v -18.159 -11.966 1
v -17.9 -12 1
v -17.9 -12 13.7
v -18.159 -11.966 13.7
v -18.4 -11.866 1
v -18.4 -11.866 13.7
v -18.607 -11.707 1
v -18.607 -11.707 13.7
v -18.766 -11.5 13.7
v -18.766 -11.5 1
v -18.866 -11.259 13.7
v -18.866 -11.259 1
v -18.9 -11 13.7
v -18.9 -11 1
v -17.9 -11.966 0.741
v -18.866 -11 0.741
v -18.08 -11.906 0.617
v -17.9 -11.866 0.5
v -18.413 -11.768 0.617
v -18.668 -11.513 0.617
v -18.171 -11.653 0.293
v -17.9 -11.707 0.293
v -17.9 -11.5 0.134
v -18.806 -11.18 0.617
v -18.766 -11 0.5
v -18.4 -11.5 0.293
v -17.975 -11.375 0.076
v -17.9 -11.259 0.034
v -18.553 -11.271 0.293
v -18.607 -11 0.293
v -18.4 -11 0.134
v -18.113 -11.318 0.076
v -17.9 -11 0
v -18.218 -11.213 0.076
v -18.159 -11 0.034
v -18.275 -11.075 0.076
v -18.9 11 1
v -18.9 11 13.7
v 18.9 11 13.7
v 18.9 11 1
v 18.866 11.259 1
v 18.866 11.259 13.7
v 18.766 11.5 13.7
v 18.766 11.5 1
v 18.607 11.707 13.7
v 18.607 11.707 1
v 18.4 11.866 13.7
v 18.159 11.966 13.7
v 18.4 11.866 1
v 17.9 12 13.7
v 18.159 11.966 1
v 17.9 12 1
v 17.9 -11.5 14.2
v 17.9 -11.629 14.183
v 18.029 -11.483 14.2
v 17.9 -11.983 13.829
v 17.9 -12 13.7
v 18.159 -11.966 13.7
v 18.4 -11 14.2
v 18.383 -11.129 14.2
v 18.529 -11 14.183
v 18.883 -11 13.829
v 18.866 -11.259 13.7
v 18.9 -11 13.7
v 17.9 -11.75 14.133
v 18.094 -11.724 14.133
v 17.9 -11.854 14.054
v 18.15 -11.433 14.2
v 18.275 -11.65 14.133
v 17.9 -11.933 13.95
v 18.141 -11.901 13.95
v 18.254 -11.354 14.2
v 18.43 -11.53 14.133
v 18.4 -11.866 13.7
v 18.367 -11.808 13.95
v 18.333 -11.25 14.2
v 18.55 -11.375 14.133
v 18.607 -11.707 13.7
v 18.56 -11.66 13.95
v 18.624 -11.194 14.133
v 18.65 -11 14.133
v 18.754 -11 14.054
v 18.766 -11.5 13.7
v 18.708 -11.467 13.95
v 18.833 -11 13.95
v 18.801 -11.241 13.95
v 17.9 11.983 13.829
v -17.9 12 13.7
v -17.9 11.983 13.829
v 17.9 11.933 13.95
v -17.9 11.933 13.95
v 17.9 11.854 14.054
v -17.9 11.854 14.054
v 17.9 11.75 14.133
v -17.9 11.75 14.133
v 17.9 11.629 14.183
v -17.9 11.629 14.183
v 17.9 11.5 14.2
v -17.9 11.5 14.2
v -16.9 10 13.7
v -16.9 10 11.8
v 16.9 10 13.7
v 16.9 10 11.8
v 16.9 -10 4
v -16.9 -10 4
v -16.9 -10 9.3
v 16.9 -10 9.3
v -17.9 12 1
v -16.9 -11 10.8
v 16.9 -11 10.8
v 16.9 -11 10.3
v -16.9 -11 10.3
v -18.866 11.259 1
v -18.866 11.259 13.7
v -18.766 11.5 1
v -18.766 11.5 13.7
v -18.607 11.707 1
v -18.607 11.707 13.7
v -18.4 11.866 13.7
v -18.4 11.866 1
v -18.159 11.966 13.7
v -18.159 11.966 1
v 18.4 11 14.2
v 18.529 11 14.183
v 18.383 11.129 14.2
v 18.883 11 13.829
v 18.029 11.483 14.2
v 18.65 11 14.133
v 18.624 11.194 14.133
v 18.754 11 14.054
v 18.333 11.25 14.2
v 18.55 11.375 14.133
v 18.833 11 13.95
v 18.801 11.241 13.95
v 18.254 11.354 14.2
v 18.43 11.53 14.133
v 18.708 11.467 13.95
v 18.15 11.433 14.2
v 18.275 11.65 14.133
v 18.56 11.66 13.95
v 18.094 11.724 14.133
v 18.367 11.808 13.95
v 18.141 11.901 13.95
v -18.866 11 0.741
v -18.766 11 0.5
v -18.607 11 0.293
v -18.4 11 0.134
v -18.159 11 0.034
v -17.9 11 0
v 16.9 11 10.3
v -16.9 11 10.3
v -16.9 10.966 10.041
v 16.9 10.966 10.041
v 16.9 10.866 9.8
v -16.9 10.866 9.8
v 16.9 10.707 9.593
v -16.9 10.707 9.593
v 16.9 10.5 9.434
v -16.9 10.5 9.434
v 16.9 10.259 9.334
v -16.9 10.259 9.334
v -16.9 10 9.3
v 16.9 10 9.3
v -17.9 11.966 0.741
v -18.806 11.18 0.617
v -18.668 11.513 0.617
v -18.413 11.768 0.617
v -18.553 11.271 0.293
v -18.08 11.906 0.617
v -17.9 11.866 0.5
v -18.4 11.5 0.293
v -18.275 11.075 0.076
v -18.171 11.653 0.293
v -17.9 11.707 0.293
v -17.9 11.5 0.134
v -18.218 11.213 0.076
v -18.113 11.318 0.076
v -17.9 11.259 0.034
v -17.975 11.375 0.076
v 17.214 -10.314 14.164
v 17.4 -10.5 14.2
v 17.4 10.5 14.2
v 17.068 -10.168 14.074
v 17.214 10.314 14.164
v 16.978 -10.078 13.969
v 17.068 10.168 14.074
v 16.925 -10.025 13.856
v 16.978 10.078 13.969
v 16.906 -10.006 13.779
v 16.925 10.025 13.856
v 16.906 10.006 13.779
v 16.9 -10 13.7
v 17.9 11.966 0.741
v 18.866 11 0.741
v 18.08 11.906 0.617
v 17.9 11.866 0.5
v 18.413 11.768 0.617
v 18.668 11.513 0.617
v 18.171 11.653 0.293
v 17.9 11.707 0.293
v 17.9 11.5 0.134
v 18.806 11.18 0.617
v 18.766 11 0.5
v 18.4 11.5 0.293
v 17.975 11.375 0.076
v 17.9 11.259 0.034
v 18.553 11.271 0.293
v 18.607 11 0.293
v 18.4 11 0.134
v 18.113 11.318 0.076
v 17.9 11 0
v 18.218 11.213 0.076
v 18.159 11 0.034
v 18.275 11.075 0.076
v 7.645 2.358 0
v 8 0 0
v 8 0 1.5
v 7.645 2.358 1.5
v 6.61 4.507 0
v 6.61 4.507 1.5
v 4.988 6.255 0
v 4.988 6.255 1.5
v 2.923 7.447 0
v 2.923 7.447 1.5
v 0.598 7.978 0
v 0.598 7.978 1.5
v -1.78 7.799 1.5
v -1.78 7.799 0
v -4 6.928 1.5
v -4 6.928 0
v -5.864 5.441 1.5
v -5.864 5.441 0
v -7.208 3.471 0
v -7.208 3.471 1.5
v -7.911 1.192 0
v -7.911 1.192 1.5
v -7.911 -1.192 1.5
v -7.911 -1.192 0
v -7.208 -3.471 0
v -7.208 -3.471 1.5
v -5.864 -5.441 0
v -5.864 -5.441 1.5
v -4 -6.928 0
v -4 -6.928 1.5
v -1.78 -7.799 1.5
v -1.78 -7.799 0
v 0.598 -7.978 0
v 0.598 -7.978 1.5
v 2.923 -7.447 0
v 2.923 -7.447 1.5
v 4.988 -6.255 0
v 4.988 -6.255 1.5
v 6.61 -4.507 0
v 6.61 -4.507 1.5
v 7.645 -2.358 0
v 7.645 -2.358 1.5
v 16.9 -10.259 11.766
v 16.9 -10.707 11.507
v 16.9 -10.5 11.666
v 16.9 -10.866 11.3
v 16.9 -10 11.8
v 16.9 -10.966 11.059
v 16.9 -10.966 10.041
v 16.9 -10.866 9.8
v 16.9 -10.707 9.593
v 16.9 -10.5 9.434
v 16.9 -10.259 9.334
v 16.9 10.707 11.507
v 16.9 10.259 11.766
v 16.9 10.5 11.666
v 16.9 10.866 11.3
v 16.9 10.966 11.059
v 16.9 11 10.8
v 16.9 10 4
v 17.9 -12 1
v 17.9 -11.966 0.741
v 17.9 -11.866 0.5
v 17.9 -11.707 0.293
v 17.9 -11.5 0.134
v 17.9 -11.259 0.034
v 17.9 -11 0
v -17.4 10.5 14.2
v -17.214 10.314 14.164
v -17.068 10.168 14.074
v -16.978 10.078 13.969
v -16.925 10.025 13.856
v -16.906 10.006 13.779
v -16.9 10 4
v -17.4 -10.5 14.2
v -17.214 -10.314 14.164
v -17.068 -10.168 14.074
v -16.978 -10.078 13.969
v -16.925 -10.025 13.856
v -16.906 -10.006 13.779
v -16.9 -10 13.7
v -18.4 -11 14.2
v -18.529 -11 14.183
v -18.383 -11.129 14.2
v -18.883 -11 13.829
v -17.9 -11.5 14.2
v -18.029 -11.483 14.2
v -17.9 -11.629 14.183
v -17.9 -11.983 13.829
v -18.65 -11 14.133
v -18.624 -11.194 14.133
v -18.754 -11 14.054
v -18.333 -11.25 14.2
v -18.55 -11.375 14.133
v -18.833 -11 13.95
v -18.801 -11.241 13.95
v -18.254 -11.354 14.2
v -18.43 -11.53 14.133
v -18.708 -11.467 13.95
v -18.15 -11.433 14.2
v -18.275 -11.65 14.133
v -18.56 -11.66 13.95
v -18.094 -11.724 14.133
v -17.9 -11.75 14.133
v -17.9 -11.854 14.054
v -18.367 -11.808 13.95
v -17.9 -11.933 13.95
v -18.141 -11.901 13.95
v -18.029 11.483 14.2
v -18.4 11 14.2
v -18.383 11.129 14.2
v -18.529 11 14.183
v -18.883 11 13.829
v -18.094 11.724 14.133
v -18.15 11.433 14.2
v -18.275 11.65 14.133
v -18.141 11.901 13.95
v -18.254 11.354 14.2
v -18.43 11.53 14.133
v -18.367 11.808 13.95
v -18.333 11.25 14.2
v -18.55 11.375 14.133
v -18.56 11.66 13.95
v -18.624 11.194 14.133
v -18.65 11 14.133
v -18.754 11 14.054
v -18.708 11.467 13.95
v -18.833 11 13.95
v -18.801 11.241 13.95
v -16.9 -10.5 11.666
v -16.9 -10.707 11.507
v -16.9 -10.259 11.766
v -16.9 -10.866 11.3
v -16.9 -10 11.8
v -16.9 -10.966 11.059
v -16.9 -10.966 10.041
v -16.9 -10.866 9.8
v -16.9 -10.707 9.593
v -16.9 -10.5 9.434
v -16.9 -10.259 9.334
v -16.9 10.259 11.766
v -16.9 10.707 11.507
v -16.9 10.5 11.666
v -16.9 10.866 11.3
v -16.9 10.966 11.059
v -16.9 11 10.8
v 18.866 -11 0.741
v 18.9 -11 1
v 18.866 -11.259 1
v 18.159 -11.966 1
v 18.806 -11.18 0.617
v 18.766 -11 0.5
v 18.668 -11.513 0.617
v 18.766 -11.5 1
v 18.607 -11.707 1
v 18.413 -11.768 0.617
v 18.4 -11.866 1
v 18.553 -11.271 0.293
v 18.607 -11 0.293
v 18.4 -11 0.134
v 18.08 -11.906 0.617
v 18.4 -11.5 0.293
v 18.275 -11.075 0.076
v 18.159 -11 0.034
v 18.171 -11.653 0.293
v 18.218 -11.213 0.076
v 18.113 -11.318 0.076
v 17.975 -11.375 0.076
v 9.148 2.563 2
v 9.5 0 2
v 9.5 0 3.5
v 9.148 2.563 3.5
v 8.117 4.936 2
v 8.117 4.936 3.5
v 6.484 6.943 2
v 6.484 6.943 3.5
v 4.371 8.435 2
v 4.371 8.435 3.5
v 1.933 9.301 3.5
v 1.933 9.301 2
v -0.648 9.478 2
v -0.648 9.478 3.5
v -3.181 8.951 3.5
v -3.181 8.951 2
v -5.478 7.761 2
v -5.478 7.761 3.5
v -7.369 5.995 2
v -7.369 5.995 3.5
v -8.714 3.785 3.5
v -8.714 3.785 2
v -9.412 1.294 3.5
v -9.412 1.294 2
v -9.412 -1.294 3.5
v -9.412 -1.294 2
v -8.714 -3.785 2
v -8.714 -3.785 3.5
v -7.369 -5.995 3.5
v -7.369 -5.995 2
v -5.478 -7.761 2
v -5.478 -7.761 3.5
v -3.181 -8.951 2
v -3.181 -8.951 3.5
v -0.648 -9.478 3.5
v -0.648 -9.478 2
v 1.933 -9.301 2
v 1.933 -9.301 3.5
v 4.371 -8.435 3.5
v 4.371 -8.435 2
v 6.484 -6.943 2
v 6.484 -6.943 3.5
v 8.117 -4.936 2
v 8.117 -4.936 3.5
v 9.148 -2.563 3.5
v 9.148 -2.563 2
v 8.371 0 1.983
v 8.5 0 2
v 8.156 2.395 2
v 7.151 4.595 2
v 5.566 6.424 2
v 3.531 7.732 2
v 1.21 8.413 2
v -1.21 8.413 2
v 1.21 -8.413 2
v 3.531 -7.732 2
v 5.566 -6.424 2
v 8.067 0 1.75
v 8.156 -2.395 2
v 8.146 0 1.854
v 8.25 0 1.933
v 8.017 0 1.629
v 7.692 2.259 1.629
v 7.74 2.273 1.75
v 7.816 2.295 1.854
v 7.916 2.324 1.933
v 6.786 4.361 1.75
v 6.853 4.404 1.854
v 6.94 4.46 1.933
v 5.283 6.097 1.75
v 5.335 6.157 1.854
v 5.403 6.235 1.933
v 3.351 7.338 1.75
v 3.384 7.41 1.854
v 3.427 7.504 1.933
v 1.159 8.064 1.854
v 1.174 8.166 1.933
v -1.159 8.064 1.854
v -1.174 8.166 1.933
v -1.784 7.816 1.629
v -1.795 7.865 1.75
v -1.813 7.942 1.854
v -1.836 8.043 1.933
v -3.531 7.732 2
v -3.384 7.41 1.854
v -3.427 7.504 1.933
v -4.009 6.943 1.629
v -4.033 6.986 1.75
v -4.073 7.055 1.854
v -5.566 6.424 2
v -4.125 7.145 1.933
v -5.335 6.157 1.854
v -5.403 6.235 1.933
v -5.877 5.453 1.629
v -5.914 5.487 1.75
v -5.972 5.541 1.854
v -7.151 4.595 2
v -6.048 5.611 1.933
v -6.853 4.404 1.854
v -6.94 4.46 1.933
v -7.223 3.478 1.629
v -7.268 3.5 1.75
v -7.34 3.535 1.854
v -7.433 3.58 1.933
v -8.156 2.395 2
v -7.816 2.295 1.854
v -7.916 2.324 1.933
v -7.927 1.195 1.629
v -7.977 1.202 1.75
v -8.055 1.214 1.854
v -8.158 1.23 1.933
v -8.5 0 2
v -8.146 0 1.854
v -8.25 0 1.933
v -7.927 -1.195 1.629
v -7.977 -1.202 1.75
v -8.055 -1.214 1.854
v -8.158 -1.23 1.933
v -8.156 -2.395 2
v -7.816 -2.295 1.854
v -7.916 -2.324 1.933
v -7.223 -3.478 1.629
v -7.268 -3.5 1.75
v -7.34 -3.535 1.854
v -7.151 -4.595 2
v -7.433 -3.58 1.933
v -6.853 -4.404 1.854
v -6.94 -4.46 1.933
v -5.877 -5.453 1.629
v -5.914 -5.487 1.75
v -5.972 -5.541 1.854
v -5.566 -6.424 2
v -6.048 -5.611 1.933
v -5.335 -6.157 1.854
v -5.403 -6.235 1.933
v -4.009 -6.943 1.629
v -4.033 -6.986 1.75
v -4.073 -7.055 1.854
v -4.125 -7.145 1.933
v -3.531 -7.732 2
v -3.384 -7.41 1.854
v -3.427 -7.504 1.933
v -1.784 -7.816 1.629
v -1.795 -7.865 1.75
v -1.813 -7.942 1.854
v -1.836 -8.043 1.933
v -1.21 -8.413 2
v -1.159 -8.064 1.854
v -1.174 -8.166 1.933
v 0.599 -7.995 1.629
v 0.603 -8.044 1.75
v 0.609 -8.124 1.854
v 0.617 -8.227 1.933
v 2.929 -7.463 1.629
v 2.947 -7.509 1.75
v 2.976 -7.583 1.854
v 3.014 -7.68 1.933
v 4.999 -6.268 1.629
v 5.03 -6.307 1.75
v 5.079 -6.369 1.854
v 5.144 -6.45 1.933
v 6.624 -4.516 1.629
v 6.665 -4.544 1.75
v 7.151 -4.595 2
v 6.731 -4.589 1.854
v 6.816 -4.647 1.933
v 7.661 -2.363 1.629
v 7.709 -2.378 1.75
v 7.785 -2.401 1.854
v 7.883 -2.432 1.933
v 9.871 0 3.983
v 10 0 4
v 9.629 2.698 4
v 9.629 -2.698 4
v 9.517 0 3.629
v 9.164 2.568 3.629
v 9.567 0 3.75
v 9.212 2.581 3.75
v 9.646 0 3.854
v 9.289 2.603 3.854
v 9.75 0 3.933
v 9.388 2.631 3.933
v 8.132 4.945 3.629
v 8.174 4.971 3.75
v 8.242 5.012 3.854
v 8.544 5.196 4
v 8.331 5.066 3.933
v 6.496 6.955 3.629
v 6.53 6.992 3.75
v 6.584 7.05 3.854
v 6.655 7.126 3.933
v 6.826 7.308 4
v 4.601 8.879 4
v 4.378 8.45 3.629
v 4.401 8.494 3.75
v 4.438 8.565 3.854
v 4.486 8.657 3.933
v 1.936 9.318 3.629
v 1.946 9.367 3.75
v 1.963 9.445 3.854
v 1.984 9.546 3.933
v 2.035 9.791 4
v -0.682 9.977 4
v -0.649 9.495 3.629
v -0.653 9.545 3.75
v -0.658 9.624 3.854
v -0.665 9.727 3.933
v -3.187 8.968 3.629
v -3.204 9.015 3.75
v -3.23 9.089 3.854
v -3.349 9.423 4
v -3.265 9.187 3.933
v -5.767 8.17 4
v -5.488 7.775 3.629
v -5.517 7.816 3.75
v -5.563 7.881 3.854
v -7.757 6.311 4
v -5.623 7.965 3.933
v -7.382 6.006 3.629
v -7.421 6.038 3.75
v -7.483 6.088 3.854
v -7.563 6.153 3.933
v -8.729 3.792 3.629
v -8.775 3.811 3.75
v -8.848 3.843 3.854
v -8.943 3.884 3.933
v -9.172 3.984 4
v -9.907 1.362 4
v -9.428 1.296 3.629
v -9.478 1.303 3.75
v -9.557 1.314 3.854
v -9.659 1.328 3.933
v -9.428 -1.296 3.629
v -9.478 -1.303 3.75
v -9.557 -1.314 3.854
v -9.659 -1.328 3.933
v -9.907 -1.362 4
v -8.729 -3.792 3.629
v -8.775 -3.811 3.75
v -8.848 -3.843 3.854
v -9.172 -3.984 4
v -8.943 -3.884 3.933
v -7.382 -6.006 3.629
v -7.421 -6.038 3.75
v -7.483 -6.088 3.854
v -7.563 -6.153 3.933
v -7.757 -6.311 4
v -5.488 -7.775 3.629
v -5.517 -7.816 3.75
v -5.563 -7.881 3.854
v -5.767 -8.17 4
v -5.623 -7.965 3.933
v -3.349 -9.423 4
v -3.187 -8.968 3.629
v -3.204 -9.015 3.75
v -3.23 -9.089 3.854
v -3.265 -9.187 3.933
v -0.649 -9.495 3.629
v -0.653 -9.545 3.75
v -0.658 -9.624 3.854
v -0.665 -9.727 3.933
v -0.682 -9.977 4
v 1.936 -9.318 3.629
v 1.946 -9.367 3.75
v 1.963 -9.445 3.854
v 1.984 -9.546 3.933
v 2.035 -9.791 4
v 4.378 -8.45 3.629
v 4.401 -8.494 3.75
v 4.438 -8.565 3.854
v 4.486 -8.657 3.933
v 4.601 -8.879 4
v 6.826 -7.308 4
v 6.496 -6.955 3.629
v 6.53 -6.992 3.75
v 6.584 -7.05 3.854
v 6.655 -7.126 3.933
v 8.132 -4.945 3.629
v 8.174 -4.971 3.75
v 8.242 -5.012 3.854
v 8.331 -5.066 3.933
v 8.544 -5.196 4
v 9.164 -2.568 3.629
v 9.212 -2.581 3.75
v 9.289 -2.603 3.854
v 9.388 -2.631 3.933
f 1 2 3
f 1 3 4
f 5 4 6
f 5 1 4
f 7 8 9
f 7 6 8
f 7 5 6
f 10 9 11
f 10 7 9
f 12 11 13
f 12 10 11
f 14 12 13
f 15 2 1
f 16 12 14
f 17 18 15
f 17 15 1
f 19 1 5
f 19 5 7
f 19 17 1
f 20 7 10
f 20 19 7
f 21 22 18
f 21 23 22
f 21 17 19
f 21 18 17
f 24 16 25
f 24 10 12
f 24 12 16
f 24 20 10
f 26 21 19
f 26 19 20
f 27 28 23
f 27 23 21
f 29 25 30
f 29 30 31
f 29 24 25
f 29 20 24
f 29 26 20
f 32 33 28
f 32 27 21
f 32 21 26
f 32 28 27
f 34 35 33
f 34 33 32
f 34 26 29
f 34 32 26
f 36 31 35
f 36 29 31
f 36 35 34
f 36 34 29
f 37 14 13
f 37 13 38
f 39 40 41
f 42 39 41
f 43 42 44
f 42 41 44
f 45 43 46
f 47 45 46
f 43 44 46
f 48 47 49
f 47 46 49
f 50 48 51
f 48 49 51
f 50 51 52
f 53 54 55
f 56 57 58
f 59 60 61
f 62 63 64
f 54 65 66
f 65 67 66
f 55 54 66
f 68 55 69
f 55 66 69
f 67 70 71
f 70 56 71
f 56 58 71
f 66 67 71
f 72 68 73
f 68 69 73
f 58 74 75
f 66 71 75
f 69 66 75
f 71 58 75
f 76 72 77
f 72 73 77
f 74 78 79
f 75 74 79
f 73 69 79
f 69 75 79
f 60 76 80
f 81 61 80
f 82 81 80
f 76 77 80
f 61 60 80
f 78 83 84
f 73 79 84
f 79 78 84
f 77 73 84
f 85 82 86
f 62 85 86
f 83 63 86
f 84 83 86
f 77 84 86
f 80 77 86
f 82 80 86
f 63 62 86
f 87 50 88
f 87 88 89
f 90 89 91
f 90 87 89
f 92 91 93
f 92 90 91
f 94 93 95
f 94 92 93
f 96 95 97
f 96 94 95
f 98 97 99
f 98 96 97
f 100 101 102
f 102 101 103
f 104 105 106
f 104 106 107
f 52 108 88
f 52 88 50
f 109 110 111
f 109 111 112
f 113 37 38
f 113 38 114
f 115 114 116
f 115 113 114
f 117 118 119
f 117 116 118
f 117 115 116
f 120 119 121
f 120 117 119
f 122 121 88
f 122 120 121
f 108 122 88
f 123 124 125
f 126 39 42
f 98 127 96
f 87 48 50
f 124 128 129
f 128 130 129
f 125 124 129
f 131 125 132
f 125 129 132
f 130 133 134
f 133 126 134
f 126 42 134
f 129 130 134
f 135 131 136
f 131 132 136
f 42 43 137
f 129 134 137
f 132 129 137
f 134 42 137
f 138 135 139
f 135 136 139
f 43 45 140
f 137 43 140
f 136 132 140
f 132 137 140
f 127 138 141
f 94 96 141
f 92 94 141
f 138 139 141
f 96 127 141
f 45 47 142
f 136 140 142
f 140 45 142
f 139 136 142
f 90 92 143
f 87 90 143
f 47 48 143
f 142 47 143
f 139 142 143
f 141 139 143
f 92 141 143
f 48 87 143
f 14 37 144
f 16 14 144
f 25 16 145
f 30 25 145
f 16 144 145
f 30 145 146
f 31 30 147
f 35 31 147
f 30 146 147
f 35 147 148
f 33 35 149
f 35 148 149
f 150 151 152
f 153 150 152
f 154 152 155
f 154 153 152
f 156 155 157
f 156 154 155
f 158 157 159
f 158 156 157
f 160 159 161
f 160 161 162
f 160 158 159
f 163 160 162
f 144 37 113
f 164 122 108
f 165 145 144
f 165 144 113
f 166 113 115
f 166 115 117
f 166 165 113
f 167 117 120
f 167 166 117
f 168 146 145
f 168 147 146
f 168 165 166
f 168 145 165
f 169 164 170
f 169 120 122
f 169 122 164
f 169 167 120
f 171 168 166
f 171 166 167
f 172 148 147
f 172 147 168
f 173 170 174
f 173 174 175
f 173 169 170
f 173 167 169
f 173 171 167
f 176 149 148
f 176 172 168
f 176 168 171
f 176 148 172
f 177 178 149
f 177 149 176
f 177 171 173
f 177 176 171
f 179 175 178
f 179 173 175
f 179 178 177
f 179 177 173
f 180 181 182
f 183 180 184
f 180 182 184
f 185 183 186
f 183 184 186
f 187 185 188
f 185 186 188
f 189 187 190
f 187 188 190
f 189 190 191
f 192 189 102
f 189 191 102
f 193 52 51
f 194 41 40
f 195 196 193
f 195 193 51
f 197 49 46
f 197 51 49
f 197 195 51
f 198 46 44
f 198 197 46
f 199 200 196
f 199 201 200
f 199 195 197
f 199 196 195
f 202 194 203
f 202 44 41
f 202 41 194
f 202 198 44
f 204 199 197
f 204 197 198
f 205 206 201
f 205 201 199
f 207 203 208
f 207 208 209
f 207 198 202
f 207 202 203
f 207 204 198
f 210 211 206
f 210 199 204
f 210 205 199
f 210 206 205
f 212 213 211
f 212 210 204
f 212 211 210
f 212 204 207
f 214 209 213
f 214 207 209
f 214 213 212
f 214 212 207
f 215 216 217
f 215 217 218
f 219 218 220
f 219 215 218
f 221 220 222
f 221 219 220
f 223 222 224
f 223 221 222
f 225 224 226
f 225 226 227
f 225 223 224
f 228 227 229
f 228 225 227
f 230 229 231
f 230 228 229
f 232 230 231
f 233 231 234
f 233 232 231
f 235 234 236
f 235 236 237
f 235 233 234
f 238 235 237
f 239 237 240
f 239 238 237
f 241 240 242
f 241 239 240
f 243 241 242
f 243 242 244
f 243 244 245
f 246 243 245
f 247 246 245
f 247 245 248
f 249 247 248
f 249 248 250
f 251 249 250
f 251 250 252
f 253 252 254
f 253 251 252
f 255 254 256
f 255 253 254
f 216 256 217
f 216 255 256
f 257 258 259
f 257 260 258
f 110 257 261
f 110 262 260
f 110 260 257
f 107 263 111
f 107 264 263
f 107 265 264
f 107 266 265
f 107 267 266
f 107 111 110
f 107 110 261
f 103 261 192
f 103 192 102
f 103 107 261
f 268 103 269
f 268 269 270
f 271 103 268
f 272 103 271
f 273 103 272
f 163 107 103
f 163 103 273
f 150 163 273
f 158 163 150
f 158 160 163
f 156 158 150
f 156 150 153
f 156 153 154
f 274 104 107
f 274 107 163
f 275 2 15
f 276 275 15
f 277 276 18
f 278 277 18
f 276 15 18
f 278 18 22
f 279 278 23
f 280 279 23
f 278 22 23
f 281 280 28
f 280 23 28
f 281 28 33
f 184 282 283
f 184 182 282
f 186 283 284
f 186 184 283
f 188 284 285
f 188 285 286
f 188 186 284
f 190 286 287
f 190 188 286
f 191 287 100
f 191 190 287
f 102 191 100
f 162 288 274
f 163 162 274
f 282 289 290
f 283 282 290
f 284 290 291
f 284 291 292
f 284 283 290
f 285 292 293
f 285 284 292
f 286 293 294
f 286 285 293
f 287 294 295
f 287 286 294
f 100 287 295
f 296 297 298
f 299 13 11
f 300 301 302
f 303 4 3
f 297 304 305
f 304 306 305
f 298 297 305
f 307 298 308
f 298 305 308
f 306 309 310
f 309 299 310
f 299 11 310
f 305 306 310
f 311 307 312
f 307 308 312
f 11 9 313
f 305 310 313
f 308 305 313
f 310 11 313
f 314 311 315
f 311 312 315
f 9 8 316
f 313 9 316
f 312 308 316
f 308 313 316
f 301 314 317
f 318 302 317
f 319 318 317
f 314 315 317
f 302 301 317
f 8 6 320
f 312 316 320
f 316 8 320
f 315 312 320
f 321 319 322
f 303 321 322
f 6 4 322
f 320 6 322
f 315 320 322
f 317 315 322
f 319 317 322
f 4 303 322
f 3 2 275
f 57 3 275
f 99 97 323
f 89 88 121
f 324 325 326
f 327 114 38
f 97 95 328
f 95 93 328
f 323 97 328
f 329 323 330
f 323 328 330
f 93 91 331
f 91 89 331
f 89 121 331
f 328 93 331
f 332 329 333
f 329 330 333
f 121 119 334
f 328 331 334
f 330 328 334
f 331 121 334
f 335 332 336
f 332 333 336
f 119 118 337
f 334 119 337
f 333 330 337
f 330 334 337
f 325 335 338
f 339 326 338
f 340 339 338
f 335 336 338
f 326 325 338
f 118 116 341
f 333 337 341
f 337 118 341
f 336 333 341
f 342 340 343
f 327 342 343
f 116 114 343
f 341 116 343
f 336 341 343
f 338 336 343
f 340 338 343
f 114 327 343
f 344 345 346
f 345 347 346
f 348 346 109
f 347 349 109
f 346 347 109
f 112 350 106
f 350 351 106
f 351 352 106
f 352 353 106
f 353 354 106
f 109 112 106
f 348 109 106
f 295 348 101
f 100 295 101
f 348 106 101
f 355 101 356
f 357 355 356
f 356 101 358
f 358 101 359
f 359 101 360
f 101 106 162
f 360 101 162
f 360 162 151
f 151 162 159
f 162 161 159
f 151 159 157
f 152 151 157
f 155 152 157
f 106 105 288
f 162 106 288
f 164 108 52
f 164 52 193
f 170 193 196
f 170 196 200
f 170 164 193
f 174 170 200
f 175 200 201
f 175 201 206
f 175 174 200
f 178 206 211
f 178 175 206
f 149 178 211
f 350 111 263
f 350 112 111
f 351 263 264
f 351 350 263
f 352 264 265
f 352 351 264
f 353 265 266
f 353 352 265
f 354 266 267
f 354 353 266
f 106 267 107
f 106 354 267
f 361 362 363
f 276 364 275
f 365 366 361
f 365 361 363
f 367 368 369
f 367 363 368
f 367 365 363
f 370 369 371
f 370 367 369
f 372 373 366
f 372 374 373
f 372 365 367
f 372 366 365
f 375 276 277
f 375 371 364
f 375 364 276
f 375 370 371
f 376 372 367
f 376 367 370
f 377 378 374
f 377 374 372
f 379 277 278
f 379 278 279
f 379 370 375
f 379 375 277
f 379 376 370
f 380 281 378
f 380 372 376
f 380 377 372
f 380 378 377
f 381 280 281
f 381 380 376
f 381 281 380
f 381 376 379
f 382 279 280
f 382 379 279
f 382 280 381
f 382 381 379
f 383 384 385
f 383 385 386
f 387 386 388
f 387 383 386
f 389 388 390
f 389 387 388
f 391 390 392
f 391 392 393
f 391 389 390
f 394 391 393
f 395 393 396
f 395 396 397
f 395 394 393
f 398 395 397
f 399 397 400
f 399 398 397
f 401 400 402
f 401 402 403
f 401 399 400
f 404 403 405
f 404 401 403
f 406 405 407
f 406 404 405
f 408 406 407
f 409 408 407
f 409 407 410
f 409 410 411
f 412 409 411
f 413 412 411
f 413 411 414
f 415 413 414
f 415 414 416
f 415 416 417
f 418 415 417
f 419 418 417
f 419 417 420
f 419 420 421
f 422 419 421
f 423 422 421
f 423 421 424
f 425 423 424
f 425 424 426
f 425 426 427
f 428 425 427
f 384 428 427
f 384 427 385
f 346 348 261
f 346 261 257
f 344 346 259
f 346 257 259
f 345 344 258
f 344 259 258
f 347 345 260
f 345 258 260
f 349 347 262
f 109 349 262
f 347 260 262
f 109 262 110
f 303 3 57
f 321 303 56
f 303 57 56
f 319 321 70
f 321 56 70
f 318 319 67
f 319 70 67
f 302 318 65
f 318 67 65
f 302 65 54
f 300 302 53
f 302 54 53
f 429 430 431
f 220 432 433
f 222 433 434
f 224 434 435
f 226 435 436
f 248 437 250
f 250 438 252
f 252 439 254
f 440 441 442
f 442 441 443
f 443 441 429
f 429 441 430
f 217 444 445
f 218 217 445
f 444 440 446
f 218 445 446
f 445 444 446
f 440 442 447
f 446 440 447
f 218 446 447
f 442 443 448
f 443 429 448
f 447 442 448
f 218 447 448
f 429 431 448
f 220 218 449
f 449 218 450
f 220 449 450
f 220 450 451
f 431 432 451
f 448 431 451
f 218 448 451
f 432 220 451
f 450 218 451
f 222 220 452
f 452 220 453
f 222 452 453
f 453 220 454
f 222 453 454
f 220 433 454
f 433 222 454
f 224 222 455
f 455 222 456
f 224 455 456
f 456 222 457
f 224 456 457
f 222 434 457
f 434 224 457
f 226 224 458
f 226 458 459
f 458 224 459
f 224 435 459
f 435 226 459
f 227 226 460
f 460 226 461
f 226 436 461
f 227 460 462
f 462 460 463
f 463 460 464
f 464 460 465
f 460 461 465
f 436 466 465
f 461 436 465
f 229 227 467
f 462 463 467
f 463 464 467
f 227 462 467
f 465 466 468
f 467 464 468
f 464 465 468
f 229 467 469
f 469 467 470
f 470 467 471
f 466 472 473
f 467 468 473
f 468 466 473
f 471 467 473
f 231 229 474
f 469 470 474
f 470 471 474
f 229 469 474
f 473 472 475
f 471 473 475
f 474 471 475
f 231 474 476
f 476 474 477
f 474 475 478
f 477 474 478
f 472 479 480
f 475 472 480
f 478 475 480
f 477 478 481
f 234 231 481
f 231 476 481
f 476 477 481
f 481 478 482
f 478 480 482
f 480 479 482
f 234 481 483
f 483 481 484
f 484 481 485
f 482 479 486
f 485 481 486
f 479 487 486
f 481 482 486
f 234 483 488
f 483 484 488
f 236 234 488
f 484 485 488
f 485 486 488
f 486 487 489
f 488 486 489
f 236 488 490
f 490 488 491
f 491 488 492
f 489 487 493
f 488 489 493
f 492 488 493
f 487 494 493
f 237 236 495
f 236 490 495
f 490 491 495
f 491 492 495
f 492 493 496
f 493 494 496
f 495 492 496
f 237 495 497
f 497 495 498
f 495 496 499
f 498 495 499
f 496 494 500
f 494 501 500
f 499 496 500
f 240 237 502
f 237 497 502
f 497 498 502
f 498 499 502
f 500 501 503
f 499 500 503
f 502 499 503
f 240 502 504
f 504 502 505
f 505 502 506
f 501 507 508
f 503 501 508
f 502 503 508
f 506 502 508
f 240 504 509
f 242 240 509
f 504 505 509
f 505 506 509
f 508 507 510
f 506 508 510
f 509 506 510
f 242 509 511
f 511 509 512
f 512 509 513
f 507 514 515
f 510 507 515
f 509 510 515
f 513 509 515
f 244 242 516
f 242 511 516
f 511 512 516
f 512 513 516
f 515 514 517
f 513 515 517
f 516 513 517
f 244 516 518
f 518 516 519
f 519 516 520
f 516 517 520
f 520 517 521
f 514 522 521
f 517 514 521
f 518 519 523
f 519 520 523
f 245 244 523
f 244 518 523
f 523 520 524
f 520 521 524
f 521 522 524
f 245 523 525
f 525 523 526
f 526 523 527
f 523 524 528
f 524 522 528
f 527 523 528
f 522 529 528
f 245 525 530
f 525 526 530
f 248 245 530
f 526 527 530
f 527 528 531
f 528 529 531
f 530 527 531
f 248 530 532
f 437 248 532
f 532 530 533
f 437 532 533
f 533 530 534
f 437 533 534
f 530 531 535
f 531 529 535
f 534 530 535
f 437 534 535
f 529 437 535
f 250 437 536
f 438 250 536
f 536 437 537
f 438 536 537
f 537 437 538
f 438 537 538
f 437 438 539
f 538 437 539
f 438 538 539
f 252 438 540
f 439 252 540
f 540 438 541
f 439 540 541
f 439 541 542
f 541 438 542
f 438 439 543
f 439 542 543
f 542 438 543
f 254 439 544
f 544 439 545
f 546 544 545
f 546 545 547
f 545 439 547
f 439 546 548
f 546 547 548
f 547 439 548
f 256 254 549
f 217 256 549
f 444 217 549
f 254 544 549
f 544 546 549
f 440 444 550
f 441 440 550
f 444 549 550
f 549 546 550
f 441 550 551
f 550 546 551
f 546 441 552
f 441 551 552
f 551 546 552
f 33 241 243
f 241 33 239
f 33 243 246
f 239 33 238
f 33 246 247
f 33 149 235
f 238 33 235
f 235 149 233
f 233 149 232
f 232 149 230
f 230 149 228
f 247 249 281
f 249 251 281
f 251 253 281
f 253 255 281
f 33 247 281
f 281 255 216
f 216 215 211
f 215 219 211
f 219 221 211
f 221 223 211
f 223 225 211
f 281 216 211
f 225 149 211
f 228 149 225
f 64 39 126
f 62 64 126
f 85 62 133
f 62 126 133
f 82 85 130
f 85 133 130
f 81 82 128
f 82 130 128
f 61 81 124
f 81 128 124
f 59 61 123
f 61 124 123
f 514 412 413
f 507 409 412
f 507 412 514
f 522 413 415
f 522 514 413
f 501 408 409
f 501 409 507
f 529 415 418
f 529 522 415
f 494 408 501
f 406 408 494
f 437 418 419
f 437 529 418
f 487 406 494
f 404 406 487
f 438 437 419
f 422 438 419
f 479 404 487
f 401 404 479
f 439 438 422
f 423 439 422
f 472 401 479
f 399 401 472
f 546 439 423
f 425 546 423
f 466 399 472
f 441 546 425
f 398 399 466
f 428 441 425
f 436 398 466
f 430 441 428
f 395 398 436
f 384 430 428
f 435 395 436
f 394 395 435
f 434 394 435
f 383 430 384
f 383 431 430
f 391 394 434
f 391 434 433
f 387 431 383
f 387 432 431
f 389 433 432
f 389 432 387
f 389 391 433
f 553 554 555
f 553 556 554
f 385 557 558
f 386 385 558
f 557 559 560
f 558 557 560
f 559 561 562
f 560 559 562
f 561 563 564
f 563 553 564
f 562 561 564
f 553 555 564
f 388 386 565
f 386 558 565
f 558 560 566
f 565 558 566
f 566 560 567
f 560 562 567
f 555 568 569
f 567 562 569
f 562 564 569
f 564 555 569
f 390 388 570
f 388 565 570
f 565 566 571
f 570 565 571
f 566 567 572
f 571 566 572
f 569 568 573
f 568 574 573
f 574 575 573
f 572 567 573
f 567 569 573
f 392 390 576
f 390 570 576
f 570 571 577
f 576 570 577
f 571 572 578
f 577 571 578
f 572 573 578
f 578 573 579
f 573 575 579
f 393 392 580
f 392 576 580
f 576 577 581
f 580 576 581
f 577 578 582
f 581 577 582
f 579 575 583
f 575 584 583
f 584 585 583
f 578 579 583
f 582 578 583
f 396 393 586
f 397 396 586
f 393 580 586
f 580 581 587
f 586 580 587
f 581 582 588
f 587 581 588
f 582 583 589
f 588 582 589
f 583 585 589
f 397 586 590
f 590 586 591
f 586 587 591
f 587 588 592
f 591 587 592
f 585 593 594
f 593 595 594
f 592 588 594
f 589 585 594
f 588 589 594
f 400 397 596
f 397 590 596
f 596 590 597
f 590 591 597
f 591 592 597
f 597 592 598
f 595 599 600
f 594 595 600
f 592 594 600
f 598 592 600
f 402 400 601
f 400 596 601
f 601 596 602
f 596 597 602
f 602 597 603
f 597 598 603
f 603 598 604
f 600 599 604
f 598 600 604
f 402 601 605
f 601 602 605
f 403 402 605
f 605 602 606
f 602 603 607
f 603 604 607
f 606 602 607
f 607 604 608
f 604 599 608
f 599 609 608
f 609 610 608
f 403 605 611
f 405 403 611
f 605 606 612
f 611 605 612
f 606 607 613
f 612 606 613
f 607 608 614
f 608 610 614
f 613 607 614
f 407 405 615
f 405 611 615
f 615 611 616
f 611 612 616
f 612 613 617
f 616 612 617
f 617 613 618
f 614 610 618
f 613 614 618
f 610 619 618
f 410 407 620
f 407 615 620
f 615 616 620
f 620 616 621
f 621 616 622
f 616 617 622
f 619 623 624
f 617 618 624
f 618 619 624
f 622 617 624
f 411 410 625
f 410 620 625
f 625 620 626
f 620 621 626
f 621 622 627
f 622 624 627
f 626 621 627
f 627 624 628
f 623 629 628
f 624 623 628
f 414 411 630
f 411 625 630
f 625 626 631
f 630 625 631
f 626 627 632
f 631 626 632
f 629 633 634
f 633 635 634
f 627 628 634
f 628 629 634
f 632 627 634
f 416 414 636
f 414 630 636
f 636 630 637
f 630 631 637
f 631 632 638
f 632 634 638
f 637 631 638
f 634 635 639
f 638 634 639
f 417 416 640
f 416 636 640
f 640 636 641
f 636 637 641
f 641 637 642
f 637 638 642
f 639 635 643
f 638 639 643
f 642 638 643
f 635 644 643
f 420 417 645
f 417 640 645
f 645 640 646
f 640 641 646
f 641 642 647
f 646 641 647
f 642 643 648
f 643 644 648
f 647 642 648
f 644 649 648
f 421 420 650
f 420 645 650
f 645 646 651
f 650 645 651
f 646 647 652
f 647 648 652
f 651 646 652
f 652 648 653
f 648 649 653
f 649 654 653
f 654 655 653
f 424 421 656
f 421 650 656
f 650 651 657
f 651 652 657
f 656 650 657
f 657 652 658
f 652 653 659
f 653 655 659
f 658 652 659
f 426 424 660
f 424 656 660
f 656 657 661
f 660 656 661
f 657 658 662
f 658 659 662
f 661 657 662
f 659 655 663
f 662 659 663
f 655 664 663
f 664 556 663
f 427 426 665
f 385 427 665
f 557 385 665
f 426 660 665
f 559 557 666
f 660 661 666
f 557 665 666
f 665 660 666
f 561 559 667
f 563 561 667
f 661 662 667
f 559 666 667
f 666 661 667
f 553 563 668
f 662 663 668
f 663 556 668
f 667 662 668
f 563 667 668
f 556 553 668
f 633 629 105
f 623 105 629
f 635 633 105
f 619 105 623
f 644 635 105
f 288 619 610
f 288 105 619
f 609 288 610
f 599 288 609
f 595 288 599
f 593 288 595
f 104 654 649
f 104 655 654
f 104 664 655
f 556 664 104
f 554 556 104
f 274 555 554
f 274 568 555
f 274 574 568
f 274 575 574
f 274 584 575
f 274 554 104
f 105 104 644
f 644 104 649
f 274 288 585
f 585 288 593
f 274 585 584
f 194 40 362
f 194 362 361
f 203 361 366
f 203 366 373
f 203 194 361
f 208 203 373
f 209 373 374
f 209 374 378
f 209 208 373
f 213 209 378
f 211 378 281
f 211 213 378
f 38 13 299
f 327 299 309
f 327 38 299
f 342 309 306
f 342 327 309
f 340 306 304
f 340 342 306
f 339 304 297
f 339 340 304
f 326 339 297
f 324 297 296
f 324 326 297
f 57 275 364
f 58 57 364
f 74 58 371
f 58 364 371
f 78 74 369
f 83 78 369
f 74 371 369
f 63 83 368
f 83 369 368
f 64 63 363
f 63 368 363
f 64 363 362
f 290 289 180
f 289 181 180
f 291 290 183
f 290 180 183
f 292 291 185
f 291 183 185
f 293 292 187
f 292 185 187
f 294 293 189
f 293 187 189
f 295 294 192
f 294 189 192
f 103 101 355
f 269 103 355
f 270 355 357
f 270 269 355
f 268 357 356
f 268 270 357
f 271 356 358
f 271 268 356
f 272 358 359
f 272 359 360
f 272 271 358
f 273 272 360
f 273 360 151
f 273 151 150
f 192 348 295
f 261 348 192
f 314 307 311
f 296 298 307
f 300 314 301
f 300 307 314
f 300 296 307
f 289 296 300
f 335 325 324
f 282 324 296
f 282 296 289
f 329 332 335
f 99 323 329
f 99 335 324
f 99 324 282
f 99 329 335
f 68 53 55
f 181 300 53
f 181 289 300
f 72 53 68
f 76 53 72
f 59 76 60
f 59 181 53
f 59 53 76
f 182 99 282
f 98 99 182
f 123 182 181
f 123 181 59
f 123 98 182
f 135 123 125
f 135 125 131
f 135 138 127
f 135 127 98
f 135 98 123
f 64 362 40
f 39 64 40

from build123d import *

# Parameters (mm, degrees)
F0_W          = 37.8
F0_H          = 24
F0_W_2        = 33.8
F0_H_2        = 20
F1_DEPTH      = 14.2
F0_R          = 9.5
F2_DEPTH      = 4
F0_R_2        = 8
F3_DEPTH      = 2
F4_W          = 33.8
F4_H          = 2.5
F5_DEPTH      = 1
F7_DEPTH      = 1
F8_R          = 0.49999
F9_R          = 0.99999
F10_T1_DEPTH  = 35.8
F10_T3_DEPTH  = 22
F10_T5_DEPTH  = 13.2
F10_T8_ANGLE  = 90
F10_T10_ANGLE = 90
F10_T12_ANGLE = 90
F10_T14_ANGLE = 90
F10_S17_W     = 1
F10_S17_H     = 1
F10_T18_DEPTH = 1
F10_S23_W     = 1
F10_S23_H     = 1
F10_T24_DEPTH = 1
F10_S29_W     = 1
F10_S29_H     = 1
F10_T30_DEPTH = 1
F10_S35_W     = 1
F10_S35_H     = 1
F10_T36_DEPTH = 1


# Not quite as in the source:
# - a fillet or chamfer that OpenCascade refuses, or shapes differently, is made with other operations: its cross-section is extruded or revolved along the edge and cut away or added
# - a fillet or chamfer is up to 0.001 mm smaller than in the source, because OpenCascade refuses the exact size


with BuildPart() as f1:
    # F0 (on Top) → F1 (new body)
    with BuildSketch(Plane.XY):
        Rectangle(F0_W, F0_H)
        Rectangle(F0_W_2, F0_H_2, mode=Mode.SUBTRACT)
    extrude(amount=F1_DEPTH)

    # F0 (on Top) → F2 (join)
    with BuildSketch(Plane.XY):
        Rectangle(F0_W_2, F0_H_2)
        Circle(F0_R, mode=Mode.SUBTRACT)
    extrude(amount=F2_DEPTH)

    # F0 (on Top) → F3 (join)
    with BuildSketch(Plane.XY):
        Circle(F0_R)
        Circle(F0_R_2, mode=Mode.SUBTRACT)
    extrude(amount=F3_DEPTH)

    # F4 (on face) → F5 (cut)
    with BuildSketch(Plane.XZ.offset(-10)):
        with Locations((0, 10.55)):
            Rectangle(F4_W, F4_H)
    extrude(amount=-F5_DEPTH, mode=Mode.SUBTRACT)

    # F6 (on face) → F7 (cut)
    with BuildSketch(Plane(origin=(0, -10, 0), x_dir=(-1, 0, 0), z_dir=(0, 1, 0))):
        Polygon((-16.9, 9.3), (1.5624057269, 9.3), (16.9, 9.3), (16.9, 11.8), (-16.9, 11.8), align=None)
    extrude(amount=-F7_DEPTH, mode=Mode.SUBTRACT)

    # F8 (radius 0.5 in the source; OpenCascade refuses exactly that, so slightly less here)
    f8_edges = [f1.edges().sort_by_distance(p)[0] for p in [
        (-9.5, 0, 4),
        (-8, 0, 2),
        (0, 10, 14.2),
        (16.9, 0, 14.2),
        (-16.9, 0, 14.2),
        (0, -10, 14.2),
        (0, -12, 14.2),
        (18.9, 0, 14.2),
        (0, 12, 14.2),
        (-18.9, 0, 14.2),
    ]]
    fillet(f8_edges, radius=F8_R)

    # F9 (radius 1 in the source; OpenCascade refuses exactly that, so slightly less here)
    f9_edges = [f1.edges().sort_by_distance(p)[0] for p in [
        (0, 11, 9.3),
        (0, 11, 11.8),
        (0, -11, 9.3),
        (0, -11, 11.8),
    ]]
    fillet(f9_edges, radius=F9_R)

    # F10: fillet of radius 1 on 8 edges, made by hand

    # F10_s2 → F10_t1 (cut)
    with BuildSketch(Plane.YZ.offset(-17.9)):
        with BuildLine():
            ThreePointArc((-12, 1), (-11.7071067812, 0.2928932188), (-11, 0))
            Line((-11, 0), (-12, 0))
            Line((-12, 0), (-12, 1))
        make_face()
        with BuildLine():
            ThreePointArc((12, 1), (11.7071067812, 0.2928932188), (11, 0))
            Line((11, 0), (12, 0))
            Line((12, 0), (12, 1))
        make_face()
    extrude(amount=F10_T1_DEPTH, mode=Mode.SUBTRACT)

    # F10_s4 → F10_t3 (cut)
    with BuildSketch(Plane.XZ.offset(-11)):
        with BuildLine():
            ThreePointArc((-18.9, 1), (-18.6071067812, 0.2928932188), (-17.9, 0))
            Line((-17.9, 0), (-18.9, 0))
            Line((-18.9, 0), (-18.9, 1))
        make_face()
        with BuildLine():
            ThreePointArc((18.9, 1), (18.6071067812, 0.2928932188), (17.9, 0))
            Line((17.9, 0), (18.9, 0))
            Line((18.9, 0), (18.9, 1))
        make_face()
    extrude(amount=F10_T3_DEPTH, mode=Mode.SUBTRACT)

    # F10_s6 → F10_t5 (cut)
    with BuildSketch(Plane.XY.offset(1)):
        with BuildLine():
            ThreePointArc((17.9, -12), (18.6071067812, -11.7071067812), (18.9, -11))
            Line((18.9, -11), (18.9, -12))
            Line((18.9, -12), (17.9, -12))
        make_face()
        with BuildLine():
            ThreePointArc((-17.9, -12), (-18.6071067812, -11.7071067812), (-18.9, -11))
            Line((-18.9, -11), (-18.9, -12))
            Line((-18.9, -12), (-17.9, -12))
        make_face()
        with BuildLine():
            ThreePointArc((18.9, 11), (18.6071067812, 11.7071067812), (17.9, 12))
            Line((17.9, 12), (18.9, 12))
            Line((18.9, 12), (18.9, 11))
        make_face()
        with BuildLine():
            ThreePointArc((-18.9, 11), (-18.6071067812, 11.7071067812), (-17.9, 12))
            Line((-17.9, 12), (-18.9, 12))
            Line((-18.9, 12), (-18.9, 11))
        make_face()
    extrude(amount=F10_T5_DEPTH, mode=Mode.SUBTRACT)

    # F10_s7 → F10_t8 (revolve, cut)
    with BuildSketch(Plane.YZ.offset(-17.9)):
        with BuildLine():
            ThreePointArc((11.50001, 14.2), (11.8535563195, 14.0535563195), (12, 13.70001))
            Line((12, 13.70001), (12, 14.2))
            Line((12, 14.2), (11.50001, 14.2))
        make_face()
    revolve(axis=Axis((-17.9, 11, 14.2), (0, 0, 1)), revolution_arc=F10_T8_ANGLE, mode=Mode.SUBTRACT)

    # F10_s9 → F10_t10 (revolve, cut)
    with BuildSketch(Plane.XZ.offset(-11)):
        with BuildLine():
            ThreePointArc((18.40001, 14.2), (18.7535563195, 14.0535563195), (18.9, 13.70001))
            Line((18.9, 13.70001), (18.9, 14.2))
            Line((18.9, 14.2), (18.40001, 14.2))
        make_face()
    revolve(axis=Axis((17.9, 11, 14.2), (0, 0, 1)), revolution_arc=F10_T10_ANGLE, mode=Mode.SUBTRACT)

    # F10_s11 → F10_t12 (revolve, cut)
    with BuildSketch(Plane.XZ.offset(11)):
        with BuildLine():
            ThreePointArc((-18.40001, 14.2), (-18.7535563195, 14.0535563195), (-18.9, 13.70001))
            Line((-18.9, 13.70001), (-18.9, 14.2))
            Line((-18.9, 14.2), (-18.40001, 14.2))
        make_face()
    revolve(axis=Axis((-17.9, -11, 14.2), (0, 0, 1)), revolution_arc=F10_T12_ANGLE, mode=Mode.SUBTRACT)

    # F10_s13 → F10_t14 (revolve, cut)
    with BuildSketch(Plane.YZ.offset(17.9)):
        with BuildLine():
            ThreePointArc((-11.50001, 14.2), (-11.8535563195, 14.0535563195), (-12, 13.70001))
            Line((-12, 13.70001), (-12, 14.2))
            Line((-12, 14.2), (-11.50001, 14.2))
        make_face()
    revolve(axis=Axis((17.9, -11, 14.2), (0, 0, 1)), revolution_arc=F10_T14_ANGLE, mode=Mode.SUBTRACT)


with BuildPart() as f10_tool16:
    # F10_s17 → F10_t18 (new body)
    with BuildSketch(Plane.XY.offset(1)):
        with Locations((-18.4, -11.5)):
            Rectangle(F10_S17_W, F10_S17_H)
    extrude(amount=-F10_T18_DEPTH)

    # F10_s19 → F10_t20 (revolve, cut)
    with BuildSketch(Plane(origin=(-17.9, -11, 1), x_dir=(0.7071067812, 0.7071067812, 0), z_dir=(-0.7071067812, 0.7071067812, 0))):
        with BuildLine():
            ThreePointArc((0, -1), (1, 0), (0, 1))
            Line((0, 1), (0, -1))
        make_face()
    revolve(axis=Axis((-17.9, -11, 1), (0, 0, -1)), mode=Mode.SUBTRACT)


with BuildPart() as f1_1:
    add(f1.part)

    # F10_t15: cut F10_tool16
    add(f10_tool16.part, mode=Mode.SUBTRACT)


with BuildPart() as f10_tool22:
    # F10_s23 → F10_t24 (new body)
    with BuildSketch(Plane.XY.offset(1)):
        with Locations((18.4, -11.5)):
            Rectangle(F10_S23_W, F10_S23_H)
    extrude(amount=-F10_T24_DEPTH)

    # F10_s25 → F10_t26 (revolve, cut)
    with BuildSketch(Plane(origin=(17.9, -11, 1), x_dir=(-0.7071067812, 0.7071067812, 0), z_dir=(-0.7071067812, -0.7071067812, 0))):
        with BuildLine():
            ThreePointArc((0, -1), (1, 0), (0, 1))
            Line((0, 1), (0, -1))
        make_face()
    revolve(axis=Axis((17.9, -11, 1), (0, 0, -1)), mode=Mode.SUBTRACT)


with BuildPart() as f1_2:
    add(f1_1.part)

    # F10_t21: cut F10_tool22
    add(f10_tool22.part, mode=Mode.SUBTRACT)


with BuildPart() as f10_tool28:
    # F10_s29 → F10_t30 (new body)
    with BuildSketch(Plane.XY.offset(1)):
        with Locations((-18.4, 11.5)):
            Rectangle(F10_S29_W, F10_S29_H)
    extrude(amount=-F10_T30_DEPTH)

    # F10_s31 → F10_t32 (revolve, cut)
    with BuildSketch(Plane(origin=(-17.9, 11, 1), x_dir=(0.7071067812, -0.7071067812, 0), z_dir=(0.7071067812, 0.7071067812, 0))):
        with BuildLine():
            ThreePointArc((0, -1), (1, 0), (0, 1))
            Line((0, 1), (0, -1))
        make_face()
    revolve(axis=Axis((-17.9, 11, 1), (0, 0, -1)), mode=Mode.SUBTRACT)


with BuildPart() as f1_3:
    add(f1_2.part)

    # F10_t27: cut F10_tool28
    add(f10_tool28.part, mode=Mode.SUBTRACT)


with BuildPart() as f10_tool34:
    # F10_s35 → F10_t36 (new body)
    with BuildSketch(Plane.XY.offset(1)):
        with Locations((18.4, 11.5)):
            Rectangle(F10_S35_W, F10_S35_H)
    extrude(amount=-F10_T36_DEPTH)

    # F10_s37 → F10_t38 (revolve, cut)
    with BuildSketch(Plane(origin=(17.9, 11, 1), x_dir=(-0.7071067812, -0.7071067812, 0), z_dir=(0.7071067812, -0.7071067812, 0))):
        with BuildLine():
            ThreePointArc((0, -1), (1, 0), (0, 1))
            Line((0, 1), (0, -1))
        make_face()
    revolve(axis=Axis((17.9, 11, 1), (0, 0, -1)), mode=Mode.SUBTRACT)


with BuildPart() as f1_4:
    add(f1_3.part)

    # F10_t33: cut F10_tool34
    add(f10_tool34.part, mode=Mode.SUBTRACT)


solid = f1_4.part
